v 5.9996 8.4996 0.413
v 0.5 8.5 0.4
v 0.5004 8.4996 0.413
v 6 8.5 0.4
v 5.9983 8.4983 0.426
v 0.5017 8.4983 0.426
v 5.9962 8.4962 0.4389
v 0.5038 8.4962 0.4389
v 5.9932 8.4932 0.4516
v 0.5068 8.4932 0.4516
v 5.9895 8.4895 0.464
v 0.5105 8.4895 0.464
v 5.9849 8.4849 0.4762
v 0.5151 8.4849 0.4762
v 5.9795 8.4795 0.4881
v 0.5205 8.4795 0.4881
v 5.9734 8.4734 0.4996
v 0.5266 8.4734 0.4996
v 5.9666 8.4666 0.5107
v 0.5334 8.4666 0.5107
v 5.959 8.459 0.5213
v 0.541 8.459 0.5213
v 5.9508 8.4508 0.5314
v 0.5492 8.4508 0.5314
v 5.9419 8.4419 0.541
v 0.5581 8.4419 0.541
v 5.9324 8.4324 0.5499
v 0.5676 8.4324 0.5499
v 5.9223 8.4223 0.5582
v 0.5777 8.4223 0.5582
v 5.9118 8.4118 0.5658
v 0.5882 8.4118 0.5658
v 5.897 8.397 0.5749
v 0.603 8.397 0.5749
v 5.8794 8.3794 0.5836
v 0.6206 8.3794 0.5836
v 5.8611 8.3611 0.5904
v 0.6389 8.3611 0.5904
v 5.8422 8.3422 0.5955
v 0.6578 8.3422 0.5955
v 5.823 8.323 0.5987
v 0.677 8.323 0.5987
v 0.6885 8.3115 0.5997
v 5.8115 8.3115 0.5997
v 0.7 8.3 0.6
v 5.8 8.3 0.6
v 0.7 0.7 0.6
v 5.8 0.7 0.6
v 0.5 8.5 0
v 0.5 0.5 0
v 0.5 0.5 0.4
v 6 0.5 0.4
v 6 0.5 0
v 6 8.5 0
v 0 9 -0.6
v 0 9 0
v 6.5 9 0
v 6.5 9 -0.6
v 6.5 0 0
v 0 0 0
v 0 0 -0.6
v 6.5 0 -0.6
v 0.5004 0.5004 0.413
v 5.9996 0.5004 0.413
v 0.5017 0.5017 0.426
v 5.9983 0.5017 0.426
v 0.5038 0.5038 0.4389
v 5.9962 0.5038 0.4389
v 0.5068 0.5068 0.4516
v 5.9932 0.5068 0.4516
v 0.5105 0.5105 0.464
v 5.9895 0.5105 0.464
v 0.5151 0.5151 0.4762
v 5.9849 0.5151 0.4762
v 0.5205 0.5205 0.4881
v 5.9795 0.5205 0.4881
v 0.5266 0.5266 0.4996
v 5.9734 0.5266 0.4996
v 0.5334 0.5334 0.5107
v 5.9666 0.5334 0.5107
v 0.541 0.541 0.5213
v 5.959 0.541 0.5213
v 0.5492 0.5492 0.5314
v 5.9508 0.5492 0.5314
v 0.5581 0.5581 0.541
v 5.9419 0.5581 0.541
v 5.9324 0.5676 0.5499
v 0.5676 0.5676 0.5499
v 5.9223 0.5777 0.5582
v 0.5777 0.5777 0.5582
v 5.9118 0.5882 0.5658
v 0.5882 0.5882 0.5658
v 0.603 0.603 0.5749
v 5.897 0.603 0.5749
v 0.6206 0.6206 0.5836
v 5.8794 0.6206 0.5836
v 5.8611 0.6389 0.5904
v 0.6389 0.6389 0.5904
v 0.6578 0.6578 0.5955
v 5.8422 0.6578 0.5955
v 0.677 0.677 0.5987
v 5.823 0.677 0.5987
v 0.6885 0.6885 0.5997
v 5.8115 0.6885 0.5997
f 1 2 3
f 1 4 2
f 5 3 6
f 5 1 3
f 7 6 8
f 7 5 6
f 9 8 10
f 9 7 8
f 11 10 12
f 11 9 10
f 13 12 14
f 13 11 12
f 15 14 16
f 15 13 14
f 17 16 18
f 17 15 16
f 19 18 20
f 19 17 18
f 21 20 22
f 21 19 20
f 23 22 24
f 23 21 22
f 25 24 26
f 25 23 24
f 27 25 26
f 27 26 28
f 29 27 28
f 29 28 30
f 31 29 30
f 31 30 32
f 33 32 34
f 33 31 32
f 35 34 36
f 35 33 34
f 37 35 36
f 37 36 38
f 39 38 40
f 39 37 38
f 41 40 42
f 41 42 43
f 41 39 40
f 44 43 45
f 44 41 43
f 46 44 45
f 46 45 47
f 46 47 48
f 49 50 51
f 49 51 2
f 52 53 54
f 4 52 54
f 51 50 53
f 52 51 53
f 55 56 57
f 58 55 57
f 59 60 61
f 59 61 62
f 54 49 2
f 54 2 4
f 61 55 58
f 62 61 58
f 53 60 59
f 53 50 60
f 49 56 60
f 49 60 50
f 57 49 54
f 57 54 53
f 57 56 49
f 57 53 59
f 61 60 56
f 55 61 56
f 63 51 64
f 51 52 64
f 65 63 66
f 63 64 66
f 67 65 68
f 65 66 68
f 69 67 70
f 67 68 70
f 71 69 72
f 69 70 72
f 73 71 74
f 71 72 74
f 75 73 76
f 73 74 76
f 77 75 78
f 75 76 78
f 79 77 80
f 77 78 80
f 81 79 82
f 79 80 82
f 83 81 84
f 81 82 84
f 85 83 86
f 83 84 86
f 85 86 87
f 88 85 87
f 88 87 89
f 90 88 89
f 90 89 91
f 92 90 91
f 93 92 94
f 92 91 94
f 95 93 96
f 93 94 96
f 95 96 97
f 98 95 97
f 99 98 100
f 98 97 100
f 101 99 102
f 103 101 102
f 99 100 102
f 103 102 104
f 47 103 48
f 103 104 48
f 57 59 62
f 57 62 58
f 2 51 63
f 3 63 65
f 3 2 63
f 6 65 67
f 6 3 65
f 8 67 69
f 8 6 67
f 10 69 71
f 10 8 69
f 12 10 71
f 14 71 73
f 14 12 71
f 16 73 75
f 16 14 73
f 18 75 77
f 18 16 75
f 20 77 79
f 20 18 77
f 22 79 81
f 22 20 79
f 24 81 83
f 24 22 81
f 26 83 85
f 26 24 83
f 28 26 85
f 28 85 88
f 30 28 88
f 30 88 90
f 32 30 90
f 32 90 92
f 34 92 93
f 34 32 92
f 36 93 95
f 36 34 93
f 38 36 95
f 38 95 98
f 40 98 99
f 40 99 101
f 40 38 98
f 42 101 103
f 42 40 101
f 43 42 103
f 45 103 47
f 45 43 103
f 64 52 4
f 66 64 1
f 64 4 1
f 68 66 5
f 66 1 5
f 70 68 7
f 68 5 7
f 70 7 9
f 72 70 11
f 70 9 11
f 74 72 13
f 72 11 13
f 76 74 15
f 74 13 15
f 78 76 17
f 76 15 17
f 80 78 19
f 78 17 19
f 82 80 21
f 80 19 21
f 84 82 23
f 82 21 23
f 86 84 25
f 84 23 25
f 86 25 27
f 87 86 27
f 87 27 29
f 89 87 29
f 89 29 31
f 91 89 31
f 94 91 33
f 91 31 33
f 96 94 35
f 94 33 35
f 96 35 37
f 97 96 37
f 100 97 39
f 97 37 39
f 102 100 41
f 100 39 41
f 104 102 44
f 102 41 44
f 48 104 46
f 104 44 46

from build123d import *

# Parameters (mm, degrees)
F0_W     = 6.5
F0_H     = 9
F2_DEPTH = 0.6
F1_W     = 5.5
F1_H     = 8
F3_DEPTH = 0.6
F4_R     = 0.2


with BuildPart() as f2:
    # F0 (on Top) → F2 (new body)
    with BuildSketch(Plane.XY):
        with Locations((3.25, 4.5)):
            Rectangle(F0_W, F0_H)
    extrude(amount=-F2_DEPTH)

    # F1 (on face) → F3 (join)
    with BuildSketch(Plane.XY):
        with Locations((3.25, 4.5)):
            Rectangle(F1_W, F1_H)
    extrude(amount=F3_DEPTH)

    # F4
    f4_edges = [f2.edges().sort_by_distance(p)[0] for p in [
        (0.5, 4.5, 0.6),
        (3.25, 0.5, 0.6),
        (6, 4.5, 0.6),
        (3.25, 8.5, 0.6),
    ]]
    fillet(f4_edges, radius=F4_R)


solid = f2.part
